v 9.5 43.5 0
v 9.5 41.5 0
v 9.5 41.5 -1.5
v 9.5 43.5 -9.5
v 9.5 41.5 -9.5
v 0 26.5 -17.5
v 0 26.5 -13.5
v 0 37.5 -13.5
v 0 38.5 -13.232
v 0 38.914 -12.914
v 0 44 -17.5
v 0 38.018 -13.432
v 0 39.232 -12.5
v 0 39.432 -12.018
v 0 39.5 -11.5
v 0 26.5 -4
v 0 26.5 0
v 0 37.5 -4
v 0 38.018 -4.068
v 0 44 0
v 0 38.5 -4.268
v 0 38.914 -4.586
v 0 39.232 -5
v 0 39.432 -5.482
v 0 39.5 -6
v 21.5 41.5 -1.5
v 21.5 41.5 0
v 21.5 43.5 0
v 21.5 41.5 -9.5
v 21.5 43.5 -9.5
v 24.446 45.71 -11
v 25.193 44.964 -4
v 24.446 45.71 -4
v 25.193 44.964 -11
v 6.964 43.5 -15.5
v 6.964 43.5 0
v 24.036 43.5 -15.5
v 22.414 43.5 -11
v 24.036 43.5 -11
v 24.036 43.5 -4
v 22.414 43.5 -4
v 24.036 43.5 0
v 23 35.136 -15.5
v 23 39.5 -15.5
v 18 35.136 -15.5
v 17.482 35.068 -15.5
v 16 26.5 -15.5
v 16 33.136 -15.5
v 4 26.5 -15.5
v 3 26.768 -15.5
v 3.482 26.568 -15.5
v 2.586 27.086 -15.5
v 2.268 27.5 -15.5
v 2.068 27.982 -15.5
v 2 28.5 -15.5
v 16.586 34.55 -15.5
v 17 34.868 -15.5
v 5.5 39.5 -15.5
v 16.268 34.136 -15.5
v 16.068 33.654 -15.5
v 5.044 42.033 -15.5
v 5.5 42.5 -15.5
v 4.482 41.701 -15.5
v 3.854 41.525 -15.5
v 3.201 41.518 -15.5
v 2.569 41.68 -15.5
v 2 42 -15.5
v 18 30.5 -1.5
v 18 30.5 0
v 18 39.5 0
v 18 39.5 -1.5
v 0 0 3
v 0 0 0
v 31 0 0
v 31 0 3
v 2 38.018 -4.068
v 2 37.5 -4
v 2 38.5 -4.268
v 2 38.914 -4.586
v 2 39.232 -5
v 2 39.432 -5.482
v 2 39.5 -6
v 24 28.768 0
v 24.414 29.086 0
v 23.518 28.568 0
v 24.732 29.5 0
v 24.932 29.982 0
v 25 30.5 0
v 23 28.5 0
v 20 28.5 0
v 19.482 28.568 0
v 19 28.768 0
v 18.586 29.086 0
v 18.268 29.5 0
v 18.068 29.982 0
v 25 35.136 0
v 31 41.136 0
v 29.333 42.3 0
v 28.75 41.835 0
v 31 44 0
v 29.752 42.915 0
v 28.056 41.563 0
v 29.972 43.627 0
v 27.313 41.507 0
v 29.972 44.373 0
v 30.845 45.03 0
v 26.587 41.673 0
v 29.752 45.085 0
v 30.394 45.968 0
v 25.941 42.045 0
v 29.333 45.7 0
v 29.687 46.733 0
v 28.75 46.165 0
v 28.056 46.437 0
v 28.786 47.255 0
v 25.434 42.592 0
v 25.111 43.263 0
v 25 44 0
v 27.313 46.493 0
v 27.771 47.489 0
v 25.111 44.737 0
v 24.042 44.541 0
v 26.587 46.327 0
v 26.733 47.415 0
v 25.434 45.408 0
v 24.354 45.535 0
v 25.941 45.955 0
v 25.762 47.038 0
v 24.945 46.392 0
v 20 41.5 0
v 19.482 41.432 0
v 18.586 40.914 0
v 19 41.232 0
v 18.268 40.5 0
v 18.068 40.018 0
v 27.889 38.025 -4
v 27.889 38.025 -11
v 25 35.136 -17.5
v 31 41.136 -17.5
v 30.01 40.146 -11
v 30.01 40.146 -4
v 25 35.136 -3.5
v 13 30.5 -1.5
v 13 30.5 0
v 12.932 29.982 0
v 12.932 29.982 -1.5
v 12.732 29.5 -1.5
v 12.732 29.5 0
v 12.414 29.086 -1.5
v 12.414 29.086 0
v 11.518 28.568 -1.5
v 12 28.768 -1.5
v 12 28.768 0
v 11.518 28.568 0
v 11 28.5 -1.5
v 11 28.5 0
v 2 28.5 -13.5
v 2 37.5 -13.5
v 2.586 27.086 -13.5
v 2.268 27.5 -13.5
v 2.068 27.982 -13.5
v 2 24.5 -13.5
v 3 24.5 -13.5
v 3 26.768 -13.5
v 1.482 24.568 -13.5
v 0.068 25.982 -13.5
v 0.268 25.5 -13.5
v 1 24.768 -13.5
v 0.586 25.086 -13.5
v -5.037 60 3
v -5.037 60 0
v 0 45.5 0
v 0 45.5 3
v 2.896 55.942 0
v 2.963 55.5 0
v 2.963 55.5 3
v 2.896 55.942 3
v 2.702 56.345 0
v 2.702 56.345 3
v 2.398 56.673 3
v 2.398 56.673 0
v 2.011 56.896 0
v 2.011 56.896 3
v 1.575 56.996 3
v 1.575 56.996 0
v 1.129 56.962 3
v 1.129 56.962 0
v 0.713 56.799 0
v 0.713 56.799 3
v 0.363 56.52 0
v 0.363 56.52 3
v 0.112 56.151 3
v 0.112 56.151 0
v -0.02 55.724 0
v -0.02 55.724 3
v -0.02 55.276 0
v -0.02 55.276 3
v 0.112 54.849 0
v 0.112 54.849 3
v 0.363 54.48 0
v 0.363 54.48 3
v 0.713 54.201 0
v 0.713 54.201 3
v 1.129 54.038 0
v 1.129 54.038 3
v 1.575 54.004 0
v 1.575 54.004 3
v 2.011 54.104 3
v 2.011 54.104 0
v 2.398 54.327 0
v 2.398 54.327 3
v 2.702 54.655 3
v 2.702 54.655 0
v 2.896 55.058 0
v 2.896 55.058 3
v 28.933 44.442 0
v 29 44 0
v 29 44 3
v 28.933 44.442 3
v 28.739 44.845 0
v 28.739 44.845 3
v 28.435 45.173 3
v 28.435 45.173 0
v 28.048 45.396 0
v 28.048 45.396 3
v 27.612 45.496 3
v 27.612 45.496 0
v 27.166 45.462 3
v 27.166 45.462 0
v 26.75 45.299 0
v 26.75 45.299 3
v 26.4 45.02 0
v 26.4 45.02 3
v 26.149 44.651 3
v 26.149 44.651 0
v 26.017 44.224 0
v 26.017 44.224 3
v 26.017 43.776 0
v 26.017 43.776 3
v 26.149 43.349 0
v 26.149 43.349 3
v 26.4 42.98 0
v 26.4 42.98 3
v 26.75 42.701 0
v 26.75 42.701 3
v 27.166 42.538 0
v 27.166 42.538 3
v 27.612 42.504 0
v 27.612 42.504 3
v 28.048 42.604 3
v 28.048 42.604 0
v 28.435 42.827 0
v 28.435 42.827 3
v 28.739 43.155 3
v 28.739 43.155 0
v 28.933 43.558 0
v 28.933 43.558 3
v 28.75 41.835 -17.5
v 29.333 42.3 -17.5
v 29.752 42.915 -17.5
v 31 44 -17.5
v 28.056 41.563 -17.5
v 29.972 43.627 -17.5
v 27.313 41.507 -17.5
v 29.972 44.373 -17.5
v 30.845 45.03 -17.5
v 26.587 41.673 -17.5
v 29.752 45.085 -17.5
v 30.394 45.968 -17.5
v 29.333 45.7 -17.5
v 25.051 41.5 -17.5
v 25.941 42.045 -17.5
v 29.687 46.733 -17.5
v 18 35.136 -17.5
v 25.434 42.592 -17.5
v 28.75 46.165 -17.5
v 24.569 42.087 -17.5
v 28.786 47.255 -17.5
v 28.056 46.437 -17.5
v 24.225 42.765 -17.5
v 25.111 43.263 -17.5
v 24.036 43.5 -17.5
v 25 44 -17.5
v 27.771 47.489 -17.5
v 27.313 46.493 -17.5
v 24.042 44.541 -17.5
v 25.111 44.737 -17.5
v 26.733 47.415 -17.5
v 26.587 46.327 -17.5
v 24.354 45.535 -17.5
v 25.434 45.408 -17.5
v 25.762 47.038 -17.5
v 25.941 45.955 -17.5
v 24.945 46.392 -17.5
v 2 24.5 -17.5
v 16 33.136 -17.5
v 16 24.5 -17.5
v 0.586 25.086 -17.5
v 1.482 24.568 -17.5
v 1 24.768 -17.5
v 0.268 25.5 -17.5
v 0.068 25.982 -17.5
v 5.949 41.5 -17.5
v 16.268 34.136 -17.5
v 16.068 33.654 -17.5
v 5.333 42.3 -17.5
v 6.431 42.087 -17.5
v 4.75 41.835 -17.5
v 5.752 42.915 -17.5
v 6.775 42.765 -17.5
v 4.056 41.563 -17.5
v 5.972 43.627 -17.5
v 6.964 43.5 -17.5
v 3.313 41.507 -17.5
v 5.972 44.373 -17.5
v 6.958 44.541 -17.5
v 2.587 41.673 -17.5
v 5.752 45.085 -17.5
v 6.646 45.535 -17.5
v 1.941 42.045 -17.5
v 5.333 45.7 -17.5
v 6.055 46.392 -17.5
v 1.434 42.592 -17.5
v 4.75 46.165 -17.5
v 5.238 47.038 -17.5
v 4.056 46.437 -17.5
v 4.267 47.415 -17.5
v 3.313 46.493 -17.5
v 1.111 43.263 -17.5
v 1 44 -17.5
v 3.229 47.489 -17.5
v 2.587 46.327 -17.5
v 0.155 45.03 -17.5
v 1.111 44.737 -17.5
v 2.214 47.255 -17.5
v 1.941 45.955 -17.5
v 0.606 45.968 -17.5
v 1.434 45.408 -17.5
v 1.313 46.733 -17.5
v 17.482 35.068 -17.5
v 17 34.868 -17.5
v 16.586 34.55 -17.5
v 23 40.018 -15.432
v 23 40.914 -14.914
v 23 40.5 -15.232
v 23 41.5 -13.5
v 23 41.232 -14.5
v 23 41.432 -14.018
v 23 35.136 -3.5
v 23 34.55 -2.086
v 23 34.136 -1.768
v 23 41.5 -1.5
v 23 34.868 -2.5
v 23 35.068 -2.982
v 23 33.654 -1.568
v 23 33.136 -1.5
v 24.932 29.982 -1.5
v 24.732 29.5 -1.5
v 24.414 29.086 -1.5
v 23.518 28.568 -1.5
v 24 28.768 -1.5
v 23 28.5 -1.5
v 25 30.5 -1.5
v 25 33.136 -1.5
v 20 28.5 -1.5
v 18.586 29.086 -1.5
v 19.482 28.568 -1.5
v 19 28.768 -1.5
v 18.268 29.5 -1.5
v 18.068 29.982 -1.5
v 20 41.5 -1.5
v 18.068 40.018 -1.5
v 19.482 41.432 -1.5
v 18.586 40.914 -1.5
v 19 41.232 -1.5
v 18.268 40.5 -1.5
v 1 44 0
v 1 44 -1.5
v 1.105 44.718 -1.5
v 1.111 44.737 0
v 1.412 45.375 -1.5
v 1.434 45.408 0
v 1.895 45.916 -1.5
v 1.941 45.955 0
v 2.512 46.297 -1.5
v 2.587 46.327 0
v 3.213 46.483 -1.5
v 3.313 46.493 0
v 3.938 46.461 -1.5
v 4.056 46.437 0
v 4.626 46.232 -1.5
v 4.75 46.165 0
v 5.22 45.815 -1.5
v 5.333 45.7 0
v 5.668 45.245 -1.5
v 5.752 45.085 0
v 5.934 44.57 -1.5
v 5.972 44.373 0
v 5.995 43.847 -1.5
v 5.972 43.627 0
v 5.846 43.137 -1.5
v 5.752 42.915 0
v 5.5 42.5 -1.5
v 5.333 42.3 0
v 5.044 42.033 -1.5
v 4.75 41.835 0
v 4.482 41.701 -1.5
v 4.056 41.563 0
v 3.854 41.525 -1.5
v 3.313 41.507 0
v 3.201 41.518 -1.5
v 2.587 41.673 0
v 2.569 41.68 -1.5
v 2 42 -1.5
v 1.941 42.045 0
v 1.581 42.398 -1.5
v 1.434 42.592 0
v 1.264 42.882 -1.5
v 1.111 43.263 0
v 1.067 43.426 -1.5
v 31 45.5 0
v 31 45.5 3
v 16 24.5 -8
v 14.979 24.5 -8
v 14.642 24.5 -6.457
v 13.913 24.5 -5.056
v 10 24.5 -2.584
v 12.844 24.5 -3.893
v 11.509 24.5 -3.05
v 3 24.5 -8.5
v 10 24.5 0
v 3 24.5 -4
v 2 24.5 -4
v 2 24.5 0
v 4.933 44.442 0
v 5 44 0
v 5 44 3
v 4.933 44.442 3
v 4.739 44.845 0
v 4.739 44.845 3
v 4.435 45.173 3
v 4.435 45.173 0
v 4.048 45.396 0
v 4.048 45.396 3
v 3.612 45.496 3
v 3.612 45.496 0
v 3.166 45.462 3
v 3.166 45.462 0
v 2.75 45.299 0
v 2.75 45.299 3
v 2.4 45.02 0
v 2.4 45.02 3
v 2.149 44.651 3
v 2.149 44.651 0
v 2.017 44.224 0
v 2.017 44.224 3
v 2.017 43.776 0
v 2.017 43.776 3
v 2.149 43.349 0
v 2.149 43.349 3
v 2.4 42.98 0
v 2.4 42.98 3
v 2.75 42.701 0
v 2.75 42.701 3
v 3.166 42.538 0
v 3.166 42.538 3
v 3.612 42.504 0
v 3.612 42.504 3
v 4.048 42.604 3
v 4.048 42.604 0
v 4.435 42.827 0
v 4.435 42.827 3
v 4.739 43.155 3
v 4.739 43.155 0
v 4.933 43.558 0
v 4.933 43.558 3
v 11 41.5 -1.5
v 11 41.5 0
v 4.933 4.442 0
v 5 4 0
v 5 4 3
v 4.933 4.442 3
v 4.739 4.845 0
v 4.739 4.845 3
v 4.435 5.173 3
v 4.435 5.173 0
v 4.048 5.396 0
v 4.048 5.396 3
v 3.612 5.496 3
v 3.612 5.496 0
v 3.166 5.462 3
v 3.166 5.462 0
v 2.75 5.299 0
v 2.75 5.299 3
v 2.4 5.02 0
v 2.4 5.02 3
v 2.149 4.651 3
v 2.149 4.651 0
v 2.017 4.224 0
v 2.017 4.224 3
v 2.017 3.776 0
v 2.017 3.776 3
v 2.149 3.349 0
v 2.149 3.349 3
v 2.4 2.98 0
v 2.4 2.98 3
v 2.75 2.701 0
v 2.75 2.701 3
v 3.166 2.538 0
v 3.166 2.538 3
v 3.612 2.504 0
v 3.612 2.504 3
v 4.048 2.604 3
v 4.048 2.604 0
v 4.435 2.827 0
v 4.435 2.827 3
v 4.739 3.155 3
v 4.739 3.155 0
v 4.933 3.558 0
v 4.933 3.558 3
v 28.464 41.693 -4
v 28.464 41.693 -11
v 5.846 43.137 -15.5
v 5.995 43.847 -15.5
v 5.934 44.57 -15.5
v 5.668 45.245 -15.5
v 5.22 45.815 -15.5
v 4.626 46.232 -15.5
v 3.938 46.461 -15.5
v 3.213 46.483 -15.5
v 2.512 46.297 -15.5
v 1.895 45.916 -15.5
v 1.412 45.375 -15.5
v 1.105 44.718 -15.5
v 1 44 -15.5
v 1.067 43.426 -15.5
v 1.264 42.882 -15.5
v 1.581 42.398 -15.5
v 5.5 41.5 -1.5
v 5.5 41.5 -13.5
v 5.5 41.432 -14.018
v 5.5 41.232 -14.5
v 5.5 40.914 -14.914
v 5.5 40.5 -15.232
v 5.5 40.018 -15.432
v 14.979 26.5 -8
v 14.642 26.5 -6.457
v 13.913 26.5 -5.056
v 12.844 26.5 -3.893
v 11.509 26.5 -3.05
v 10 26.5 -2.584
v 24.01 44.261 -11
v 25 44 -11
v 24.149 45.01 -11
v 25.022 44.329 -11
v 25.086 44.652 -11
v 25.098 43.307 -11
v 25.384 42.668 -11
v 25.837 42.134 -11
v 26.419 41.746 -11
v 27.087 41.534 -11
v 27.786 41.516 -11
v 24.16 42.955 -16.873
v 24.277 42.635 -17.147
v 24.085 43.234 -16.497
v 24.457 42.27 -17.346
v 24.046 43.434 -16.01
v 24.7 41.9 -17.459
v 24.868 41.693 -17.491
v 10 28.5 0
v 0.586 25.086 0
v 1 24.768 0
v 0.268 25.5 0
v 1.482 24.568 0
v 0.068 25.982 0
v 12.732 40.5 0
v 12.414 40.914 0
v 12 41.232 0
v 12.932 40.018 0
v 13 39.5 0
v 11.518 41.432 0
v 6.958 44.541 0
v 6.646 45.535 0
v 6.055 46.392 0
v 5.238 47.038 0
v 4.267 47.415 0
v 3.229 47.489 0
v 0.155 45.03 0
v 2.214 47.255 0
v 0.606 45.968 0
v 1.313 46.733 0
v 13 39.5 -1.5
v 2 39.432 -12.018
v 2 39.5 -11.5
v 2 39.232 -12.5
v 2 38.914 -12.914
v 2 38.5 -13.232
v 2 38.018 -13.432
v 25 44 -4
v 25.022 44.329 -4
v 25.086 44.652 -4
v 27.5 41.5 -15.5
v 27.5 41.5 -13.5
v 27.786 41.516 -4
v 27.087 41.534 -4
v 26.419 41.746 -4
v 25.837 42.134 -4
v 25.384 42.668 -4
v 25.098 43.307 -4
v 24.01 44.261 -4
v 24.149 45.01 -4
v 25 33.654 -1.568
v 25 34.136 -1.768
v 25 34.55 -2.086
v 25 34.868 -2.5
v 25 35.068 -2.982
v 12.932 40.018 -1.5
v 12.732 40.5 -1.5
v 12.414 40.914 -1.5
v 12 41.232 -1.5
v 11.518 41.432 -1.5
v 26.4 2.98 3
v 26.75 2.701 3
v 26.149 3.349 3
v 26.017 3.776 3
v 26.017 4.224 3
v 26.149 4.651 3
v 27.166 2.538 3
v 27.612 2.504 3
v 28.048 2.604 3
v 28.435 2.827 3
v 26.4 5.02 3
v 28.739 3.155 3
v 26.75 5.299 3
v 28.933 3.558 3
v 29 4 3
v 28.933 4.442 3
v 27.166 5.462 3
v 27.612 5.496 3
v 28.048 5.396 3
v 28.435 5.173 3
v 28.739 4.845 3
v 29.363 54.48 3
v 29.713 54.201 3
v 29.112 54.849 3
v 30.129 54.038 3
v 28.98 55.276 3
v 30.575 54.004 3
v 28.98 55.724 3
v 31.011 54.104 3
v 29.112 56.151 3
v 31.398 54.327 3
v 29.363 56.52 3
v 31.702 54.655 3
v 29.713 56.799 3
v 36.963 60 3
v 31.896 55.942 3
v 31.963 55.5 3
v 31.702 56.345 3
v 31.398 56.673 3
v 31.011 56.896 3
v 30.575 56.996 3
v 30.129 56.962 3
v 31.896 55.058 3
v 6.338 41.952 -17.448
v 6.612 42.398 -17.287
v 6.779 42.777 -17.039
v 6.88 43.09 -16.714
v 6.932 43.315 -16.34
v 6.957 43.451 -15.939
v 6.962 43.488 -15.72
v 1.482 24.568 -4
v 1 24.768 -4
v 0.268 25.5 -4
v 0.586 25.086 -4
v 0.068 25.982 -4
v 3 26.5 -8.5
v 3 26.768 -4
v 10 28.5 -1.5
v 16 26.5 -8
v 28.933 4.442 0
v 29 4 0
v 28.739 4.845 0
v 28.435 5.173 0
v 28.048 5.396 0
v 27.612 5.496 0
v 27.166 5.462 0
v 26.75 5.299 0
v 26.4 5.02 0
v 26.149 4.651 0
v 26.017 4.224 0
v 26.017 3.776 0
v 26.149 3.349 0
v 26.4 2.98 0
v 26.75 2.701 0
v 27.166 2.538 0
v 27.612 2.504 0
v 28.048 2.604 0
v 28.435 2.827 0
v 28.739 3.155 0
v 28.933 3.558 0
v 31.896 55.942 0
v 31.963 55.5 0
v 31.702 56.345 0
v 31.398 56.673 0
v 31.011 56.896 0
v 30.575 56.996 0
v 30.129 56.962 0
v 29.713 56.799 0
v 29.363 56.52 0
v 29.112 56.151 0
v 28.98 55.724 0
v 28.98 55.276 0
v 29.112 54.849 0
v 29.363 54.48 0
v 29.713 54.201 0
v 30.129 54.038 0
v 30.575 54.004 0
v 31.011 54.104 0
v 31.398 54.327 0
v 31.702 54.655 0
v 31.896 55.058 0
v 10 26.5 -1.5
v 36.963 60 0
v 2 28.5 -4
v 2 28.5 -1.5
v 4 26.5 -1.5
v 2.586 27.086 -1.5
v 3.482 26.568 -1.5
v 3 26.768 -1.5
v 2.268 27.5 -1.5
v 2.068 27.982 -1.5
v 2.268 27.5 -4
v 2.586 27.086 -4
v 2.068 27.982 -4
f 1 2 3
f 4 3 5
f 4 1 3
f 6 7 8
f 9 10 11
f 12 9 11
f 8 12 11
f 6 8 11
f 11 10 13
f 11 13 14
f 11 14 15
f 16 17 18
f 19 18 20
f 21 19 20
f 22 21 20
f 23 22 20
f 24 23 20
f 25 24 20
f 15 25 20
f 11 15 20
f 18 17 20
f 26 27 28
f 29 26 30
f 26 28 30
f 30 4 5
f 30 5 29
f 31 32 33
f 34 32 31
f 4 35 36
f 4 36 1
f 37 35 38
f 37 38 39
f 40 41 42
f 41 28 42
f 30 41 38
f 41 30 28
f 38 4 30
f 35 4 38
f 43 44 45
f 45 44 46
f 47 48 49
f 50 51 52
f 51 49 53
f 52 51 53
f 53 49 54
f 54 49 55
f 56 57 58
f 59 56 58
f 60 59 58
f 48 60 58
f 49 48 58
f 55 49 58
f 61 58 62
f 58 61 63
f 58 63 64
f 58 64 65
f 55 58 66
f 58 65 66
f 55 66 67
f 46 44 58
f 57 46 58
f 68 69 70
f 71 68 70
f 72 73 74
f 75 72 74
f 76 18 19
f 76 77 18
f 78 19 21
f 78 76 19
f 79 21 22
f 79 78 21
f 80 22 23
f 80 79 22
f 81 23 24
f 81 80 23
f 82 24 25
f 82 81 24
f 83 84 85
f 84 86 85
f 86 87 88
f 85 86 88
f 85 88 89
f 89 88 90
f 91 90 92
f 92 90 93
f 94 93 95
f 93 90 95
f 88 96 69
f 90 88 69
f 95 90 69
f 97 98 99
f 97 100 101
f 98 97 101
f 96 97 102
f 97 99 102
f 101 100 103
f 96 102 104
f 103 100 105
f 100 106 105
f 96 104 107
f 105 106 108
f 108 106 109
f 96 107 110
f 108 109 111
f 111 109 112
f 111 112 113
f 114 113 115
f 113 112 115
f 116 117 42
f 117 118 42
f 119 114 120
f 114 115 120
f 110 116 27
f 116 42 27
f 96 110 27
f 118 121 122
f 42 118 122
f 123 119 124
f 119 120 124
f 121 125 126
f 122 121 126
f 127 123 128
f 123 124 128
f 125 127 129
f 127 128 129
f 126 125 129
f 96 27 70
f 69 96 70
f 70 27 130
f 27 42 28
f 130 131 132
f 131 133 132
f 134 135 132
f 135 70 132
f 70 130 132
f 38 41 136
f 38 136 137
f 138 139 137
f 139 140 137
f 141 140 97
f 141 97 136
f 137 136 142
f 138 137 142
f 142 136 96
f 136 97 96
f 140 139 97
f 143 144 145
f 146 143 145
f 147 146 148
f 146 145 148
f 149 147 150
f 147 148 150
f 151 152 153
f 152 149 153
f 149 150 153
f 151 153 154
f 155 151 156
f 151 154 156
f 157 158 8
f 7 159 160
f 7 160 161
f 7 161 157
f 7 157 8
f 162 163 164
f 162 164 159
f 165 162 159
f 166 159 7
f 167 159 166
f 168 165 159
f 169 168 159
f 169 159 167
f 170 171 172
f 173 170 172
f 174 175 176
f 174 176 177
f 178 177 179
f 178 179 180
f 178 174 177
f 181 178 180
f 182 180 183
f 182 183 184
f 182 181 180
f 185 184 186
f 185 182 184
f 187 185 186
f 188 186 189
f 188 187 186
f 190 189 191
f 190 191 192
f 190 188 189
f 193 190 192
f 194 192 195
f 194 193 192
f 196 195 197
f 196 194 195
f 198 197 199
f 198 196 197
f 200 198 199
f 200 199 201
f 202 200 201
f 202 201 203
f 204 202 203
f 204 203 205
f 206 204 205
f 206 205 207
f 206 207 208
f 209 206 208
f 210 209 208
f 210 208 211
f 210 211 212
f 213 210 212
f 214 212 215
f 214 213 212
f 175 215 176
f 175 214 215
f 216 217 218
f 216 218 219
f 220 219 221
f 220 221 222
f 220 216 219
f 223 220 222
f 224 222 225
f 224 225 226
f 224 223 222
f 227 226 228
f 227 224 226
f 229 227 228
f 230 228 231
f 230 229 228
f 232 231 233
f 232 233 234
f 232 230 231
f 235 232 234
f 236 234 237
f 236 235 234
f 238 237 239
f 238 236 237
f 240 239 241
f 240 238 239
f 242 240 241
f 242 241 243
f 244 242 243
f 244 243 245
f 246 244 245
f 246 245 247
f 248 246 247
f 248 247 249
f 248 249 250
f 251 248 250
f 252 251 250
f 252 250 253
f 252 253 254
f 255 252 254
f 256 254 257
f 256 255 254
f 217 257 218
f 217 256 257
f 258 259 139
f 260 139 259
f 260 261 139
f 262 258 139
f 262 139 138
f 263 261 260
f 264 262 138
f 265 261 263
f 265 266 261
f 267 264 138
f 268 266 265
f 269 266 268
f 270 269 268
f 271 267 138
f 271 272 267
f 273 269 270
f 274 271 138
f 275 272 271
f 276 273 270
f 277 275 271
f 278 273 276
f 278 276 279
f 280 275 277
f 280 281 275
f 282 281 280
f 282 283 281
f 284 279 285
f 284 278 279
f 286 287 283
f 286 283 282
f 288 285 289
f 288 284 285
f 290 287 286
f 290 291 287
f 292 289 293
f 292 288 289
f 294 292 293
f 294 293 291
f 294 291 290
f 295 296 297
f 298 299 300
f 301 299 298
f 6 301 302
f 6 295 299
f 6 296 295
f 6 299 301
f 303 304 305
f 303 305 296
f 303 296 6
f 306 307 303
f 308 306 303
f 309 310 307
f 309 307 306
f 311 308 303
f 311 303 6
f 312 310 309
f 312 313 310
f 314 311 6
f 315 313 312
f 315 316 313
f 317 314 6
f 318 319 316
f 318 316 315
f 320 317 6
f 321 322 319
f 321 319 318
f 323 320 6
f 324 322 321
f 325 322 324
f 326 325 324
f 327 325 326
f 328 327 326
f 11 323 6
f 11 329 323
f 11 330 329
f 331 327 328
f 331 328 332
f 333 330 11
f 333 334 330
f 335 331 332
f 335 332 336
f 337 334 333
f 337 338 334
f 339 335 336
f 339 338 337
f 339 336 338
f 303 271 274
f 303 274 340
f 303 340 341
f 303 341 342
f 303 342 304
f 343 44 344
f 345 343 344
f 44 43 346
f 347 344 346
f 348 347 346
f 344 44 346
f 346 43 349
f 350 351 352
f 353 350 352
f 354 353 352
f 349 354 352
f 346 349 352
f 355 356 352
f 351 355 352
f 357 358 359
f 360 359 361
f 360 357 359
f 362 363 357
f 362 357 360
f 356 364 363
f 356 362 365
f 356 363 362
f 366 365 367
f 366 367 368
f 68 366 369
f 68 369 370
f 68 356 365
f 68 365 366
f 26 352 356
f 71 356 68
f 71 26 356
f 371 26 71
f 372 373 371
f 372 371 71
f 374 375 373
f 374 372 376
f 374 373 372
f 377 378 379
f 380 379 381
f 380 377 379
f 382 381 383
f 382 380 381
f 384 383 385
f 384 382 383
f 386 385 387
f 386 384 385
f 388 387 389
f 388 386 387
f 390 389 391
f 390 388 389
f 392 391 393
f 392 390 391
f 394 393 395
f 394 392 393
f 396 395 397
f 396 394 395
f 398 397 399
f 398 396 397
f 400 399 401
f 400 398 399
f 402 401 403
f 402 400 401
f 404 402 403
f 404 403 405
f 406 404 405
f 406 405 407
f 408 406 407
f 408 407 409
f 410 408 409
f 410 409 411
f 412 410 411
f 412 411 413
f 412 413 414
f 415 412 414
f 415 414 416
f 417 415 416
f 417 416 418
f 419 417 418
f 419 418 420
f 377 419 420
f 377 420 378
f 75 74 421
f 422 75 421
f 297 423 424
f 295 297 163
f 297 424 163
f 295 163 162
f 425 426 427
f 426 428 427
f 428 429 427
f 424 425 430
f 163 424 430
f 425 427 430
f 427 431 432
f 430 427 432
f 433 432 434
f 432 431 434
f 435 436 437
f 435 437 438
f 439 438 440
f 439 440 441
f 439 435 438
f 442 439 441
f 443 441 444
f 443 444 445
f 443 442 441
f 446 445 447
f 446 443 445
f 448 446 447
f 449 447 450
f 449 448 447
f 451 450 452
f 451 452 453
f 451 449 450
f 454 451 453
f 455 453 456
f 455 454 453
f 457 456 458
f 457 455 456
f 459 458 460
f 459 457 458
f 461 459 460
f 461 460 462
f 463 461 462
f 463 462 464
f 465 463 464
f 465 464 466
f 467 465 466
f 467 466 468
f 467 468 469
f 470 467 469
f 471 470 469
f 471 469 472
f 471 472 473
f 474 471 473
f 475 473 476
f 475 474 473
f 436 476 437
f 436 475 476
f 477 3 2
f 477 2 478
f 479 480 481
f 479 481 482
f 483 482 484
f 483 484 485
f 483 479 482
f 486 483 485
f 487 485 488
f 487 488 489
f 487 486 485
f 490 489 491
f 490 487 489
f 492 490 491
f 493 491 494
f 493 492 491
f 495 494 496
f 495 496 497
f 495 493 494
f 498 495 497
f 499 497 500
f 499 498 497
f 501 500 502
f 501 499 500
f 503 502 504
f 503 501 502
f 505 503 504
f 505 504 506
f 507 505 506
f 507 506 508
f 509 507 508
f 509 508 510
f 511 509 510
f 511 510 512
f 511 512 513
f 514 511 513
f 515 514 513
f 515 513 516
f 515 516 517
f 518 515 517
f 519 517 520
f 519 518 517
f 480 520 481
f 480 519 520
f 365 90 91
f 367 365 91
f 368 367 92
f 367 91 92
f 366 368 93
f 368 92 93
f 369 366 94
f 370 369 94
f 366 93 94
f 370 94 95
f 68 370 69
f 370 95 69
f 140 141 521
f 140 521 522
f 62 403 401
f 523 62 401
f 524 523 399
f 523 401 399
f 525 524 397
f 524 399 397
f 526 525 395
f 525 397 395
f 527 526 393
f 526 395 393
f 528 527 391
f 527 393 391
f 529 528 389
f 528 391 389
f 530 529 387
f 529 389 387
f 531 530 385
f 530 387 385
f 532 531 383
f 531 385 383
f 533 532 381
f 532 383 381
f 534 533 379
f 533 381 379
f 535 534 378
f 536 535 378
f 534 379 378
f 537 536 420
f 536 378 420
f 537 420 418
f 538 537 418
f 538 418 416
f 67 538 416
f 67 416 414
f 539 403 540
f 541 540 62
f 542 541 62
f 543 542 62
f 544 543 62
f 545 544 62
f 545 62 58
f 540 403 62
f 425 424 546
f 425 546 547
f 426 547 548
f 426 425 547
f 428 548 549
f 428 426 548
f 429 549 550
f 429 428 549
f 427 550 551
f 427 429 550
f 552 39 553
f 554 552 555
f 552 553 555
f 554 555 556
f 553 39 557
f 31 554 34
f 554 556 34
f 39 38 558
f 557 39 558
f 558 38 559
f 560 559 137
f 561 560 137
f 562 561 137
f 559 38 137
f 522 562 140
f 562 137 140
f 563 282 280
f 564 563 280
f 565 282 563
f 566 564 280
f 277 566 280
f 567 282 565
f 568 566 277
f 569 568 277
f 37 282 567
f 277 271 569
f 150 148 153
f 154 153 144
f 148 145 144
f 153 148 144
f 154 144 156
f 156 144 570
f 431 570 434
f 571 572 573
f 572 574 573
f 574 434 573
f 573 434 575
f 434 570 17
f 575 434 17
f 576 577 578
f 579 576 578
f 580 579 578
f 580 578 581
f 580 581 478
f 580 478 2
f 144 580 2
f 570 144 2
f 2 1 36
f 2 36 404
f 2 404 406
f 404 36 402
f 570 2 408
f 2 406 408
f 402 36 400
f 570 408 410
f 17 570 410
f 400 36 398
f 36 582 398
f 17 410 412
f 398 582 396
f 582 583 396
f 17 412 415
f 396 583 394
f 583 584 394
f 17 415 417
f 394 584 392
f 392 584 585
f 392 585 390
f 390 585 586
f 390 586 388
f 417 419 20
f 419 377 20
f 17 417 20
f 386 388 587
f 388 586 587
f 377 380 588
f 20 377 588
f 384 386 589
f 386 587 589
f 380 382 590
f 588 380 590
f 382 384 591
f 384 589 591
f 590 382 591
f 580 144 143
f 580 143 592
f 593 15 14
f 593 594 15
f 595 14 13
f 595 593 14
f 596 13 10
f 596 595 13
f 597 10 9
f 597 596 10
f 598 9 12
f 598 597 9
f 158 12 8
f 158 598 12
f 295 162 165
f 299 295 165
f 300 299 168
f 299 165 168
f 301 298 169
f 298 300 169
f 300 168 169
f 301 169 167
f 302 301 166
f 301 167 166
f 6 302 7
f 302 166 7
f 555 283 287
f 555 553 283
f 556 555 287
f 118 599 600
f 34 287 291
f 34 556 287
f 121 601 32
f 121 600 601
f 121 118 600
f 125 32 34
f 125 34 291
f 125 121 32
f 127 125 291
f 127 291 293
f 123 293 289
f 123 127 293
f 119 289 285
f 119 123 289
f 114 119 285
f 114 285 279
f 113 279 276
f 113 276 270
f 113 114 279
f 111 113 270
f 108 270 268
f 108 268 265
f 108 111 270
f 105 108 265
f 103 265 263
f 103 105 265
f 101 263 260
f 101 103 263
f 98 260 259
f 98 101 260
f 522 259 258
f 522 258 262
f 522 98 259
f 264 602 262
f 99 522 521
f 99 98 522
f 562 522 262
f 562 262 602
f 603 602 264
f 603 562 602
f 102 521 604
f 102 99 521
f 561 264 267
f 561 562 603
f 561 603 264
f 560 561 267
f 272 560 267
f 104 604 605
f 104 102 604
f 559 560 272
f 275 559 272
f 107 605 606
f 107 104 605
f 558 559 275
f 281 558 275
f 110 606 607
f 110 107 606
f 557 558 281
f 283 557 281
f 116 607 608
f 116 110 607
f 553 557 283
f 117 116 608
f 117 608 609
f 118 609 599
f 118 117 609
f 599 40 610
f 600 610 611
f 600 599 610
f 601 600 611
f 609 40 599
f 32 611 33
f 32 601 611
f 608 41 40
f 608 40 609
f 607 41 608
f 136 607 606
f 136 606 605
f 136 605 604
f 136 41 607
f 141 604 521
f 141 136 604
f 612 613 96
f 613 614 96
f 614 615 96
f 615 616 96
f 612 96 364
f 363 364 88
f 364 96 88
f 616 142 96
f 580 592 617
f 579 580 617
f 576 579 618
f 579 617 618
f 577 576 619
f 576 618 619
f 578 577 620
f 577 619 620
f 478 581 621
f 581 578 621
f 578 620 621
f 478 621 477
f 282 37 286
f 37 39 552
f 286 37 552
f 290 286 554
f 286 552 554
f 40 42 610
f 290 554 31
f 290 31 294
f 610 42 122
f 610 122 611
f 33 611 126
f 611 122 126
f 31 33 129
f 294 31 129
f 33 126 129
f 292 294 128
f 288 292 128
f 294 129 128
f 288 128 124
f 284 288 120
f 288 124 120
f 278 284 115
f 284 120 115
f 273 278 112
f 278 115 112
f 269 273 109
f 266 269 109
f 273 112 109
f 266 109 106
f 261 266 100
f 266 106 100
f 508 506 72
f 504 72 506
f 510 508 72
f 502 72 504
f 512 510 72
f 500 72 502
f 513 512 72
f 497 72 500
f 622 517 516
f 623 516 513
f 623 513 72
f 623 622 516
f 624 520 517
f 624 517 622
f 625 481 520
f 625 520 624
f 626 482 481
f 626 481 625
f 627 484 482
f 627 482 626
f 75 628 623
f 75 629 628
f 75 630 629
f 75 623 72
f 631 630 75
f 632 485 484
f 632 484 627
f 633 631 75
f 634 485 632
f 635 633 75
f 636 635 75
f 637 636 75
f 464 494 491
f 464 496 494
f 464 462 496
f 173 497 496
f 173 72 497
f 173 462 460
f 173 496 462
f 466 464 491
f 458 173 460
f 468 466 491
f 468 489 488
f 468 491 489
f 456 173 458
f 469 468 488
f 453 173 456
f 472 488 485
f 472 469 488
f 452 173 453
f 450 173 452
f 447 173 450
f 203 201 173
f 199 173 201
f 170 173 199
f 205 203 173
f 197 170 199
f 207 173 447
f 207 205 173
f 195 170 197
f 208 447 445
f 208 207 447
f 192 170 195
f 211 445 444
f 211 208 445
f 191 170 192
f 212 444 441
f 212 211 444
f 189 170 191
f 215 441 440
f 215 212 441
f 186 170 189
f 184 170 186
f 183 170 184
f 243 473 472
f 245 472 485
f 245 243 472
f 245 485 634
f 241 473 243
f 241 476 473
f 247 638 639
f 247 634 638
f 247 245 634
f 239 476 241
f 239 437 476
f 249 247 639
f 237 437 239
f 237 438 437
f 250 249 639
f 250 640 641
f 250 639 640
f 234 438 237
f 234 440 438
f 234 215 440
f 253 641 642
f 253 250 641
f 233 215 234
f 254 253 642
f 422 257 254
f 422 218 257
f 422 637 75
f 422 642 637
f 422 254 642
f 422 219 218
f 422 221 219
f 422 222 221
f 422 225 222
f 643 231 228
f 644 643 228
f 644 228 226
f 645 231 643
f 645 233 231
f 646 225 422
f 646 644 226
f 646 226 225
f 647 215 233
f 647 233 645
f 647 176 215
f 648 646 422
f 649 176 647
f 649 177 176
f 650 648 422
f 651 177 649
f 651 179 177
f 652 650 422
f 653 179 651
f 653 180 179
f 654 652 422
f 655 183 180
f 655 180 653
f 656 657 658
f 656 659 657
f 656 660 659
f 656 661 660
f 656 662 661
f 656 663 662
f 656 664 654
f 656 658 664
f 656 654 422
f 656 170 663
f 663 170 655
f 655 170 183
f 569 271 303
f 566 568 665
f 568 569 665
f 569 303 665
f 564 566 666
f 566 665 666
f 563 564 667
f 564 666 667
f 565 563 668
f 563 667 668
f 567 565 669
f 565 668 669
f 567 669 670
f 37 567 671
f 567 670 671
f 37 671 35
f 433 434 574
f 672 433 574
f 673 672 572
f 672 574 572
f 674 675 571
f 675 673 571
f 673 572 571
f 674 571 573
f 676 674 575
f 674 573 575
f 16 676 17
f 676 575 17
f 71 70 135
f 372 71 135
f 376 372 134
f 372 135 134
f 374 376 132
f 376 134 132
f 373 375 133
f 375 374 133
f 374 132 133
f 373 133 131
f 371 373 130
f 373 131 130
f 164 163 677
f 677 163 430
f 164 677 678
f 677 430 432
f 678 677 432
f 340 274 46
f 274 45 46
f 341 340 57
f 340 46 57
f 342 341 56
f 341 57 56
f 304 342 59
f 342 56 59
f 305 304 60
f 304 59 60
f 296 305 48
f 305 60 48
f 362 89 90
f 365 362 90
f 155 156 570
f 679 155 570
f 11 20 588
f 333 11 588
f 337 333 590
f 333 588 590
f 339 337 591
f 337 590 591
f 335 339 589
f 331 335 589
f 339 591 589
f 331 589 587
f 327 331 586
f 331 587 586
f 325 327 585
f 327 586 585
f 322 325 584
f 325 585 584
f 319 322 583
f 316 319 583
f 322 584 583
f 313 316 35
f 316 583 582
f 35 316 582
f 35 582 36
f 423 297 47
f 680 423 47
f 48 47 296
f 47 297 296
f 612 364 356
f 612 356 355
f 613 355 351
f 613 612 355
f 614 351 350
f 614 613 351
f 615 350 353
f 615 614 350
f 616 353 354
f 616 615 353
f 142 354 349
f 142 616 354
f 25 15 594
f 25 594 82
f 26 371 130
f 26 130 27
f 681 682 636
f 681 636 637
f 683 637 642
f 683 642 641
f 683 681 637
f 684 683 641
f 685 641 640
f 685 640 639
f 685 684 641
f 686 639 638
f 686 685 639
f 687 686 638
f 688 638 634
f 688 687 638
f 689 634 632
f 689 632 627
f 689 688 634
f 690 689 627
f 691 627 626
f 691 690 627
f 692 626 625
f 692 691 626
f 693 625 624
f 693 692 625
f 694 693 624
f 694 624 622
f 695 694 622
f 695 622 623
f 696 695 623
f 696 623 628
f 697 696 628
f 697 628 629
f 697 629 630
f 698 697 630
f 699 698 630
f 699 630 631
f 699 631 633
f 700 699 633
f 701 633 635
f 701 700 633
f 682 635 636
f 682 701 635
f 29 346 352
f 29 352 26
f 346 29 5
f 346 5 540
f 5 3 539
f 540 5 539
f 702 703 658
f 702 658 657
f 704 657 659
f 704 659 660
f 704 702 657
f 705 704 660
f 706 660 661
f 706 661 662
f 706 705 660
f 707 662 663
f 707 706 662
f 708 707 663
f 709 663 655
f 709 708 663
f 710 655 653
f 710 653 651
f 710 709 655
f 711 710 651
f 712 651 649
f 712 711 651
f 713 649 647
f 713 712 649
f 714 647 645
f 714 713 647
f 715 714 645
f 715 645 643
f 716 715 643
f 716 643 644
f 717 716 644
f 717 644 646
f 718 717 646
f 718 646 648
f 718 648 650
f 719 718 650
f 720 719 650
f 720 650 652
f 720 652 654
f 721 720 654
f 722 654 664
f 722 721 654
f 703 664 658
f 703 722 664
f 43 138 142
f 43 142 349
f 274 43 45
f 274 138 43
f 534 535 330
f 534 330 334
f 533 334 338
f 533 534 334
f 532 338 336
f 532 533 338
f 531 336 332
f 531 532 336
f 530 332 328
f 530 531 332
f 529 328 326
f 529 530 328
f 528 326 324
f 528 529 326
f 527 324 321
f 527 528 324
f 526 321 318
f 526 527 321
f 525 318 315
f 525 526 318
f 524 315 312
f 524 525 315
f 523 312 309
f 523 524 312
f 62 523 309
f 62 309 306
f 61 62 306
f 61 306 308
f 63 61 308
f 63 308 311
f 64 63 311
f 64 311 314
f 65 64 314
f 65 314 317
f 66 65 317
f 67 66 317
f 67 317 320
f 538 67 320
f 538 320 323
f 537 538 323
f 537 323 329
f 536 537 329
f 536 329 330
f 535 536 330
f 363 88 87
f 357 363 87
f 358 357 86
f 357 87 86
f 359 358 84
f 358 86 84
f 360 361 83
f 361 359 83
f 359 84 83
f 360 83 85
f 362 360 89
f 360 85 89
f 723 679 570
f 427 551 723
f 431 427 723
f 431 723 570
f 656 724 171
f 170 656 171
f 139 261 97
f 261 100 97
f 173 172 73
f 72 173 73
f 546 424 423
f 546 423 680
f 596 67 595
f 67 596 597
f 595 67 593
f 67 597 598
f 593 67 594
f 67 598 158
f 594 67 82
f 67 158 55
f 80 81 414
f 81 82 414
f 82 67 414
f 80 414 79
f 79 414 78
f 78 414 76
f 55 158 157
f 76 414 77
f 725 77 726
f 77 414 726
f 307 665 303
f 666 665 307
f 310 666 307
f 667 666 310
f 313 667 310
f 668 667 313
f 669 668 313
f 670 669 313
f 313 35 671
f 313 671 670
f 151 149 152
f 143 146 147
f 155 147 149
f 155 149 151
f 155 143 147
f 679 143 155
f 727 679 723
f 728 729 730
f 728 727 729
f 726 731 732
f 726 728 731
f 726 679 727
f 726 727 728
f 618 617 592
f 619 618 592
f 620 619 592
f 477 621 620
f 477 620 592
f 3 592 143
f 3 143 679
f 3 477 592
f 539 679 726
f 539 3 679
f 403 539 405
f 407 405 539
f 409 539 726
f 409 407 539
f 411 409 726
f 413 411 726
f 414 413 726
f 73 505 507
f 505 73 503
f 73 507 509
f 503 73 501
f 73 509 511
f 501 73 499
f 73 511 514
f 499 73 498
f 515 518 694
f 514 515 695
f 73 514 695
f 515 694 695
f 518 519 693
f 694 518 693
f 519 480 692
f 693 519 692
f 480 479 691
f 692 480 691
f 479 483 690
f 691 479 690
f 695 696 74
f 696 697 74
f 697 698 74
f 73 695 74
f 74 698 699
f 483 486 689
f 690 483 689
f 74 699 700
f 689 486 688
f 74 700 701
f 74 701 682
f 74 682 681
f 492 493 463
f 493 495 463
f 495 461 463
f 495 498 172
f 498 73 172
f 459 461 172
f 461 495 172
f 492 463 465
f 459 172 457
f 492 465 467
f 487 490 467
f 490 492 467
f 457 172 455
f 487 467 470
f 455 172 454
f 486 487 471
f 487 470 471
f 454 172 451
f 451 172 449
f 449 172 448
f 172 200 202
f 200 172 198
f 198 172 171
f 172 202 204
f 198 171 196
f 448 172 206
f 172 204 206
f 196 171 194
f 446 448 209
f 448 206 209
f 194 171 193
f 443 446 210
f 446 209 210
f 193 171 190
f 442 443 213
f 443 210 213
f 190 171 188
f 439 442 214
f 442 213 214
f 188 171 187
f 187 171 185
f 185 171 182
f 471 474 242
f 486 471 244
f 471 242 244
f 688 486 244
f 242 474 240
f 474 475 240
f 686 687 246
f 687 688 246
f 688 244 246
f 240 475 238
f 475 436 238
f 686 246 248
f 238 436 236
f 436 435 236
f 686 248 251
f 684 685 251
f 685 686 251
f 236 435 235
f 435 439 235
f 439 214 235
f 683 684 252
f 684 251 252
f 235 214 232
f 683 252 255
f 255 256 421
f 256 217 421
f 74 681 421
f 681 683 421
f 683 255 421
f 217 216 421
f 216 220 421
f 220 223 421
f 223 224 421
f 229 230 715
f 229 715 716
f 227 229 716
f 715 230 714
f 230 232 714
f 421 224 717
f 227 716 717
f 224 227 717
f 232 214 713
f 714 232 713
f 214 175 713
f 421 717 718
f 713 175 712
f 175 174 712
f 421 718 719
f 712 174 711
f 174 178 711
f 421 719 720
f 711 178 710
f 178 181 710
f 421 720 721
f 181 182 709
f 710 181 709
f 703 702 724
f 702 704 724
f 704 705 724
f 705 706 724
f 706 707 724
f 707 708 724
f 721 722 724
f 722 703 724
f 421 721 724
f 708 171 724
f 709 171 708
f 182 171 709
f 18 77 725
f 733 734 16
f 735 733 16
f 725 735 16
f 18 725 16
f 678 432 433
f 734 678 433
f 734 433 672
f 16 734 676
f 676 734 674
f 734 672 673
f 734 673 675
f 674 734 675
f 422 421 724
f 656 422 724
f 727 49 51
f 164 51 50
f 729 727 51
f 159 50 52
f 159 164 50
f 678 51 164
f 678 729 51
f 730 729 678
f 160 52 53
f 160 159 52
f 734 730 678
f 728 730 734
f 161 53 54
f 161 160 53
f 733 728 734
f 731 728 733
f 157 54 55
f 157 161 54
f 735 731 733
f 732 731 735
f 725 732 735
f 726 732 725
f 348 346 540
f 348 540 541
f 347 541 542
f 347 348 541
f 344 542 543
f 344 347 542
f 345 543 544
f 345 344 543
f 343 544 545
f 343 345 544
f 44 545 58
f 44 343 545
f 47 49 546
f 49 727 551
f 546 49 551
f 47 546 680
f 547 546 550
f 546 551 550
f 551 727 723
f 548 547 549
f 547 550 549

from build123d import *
from build123d.topology import SkipClean

# Parameters (mm, degrees)
SKETCH1_R           = 1.5
BOSS_EXTRUDE1_DEPTH = 3
SKETCH2_R           = 2.5
BOSS_EXTRUDE2_DEPTH = 1.5
SKETCH5_R           = 2.5
BOSS_EXTRUDE5_DEPTH = 14
SKETCH6_R           = 2.5
BOSS_EXTRUDE6_DEPTH = 2
SKETCH8_W           = 9.5
SKETCH8_H           = 15
CUT_EXTRUDE1_DEPTH  = 3
CUT_EXTRUDE2_REACH  = 56.155
SKETCH9_W           = 12
SKETCH9_H           = 8
SKETCH11_W          = 8
SKETCH11_H          = 4
CUT_EXTRUDE4_DEPTH  = 2
SKETCH13_W          = 5
SKETCH13_H          = 15
CUT_EXTRUDE7_DEPTH  = 1.5
SKETCH15_W          = 12
SKETCH15_H          = 9.5
CUT_EXTRUDE8_DEPTH  = 2
SKETCH16_W          = 7
SKETCH16_H          = 3
CUT_EXTRUDE9_DEPTH  = 72.346897019
FILLET1_R           = 2
CUT_EXTRUDE11_REACH = 75.393
SKETCH21_W          = 9
SKETCH21_H          = 10.636038969
SKETCH23_R          = 6
BOSS_EXTRUDE7_DEPTH = 2
FILLET2_R           = 2


with BuildPart() as part:
    # Sketch1 → Boss-Extrude1 (new body)
    with BuildSketch(Plane.XY):
        Polygon((0, 0), (31, 0), (31, 45.5), (36.963007518, 60), (-5.036992482, 60), (0, 45.5), align=None)
        with Locations((30.463007518, 55.5)):
            Circle(SKETCH1_R, mode=Mode.SUBTRACT)
        with Locations((27.5, 44)):
            Circle(SKETCH1_R, mode=Mode.SUBTRACT)
        with Locations((27.5, 4)):
            Circle(SKETCH1_R, mode=Mode.SUBTRACT)
        with Locations((3.5, 4)):
            Circle(SKETCH1_R, mode=Mode.SUBTRACT)
        with Locations((3.5, 44)):
            Circle(SKETCH1_R, mode=Mode.SUBTRACT)
        with Locations((1.463007518, 55.5)):
            Circle(SKETCH1_R, mode=Mode.SUBTRACT)
    extrude(amount=BOSS_EXTRUDE1_DEPTH)


with BuildPart() as body_2:
    # Sketch2 → Boss-Extrude2 (new body)
    with BuildSketch(Plane(origin=(0, 0, 0), x_dir=(-1, 0, 0), z_dir=(0, 0, -1))):
        with BuildLine():
            Line((0, 24.5), (0, 44))
            ThreePointArc((0, 44), (-3.750643519, 47.491013868), (-6.964101615, 43.5))
            Line((-6.964101615, 43.5), (-24.035898385, 43.5))
            ThreePointArc((-24.035898385, 43.5), (-27.249356481, 47.491013868), (-31, 44))
            Line((-31, 44), (-31, 41.136038969))
            Line((-31, 41.136038969), (-25, 35.136038969))
            Line((-25, 35.136038969), (-25, 28.5))
            Line((-25, 28.5), (-18, 28.5))
            Line((-18, 28.5), (-18, 24.5))
            Line((-18, 24.5), (0, 24.5))
        make_face()
        with Locations((-27.5, 44)):
            Circle(SKETCH2_R, mode=Mode.SUBTRACT)
        with Locations((-3.5, 44)):
            Circle(SKETCH2_R, mode=Mode.SUBTRACT)
    extrude(amount=BOSS_EXTRUDE2_DEPTH)

    # Sketch5 → Boss-Extrude5 (add)
    with SkipClean():  # the faces are left unmerged after this step: merging them gives an invalid solid
        with BuildSketch(Plane(origin=(0, 0, -1.5), x_dir=(-1, 0, 0), z_dir=(0, 0, -1))):
            with BuildLine():
                Line((-6.964101615, 43.5), (-24.035898385, 43.5))
                ThreePointArc((-24.035898385, 43.5), (-27.249356481, 47.491013868), (-31, 44))
                Line((-31, 44), (-31, 41.136038969))
                Line((-31, 41.136038969), (-25, 35.136038969))
                Line((-25, 35.136038969), (-25, 28.5))
                Line((-25, 28.5), (-18, 28.5))
                Line((-18, 28.5), (-18, 24.5))
                Line((-18, 24.5), (0, 24.5))
                Line((0, 24.5), (0, 44))
                ThreePointArc((0, 44), (-3.750643519, 47.491013868), (-6.964101615, 43.5))
            make_face()
            with Locations((-27.5, 44)):
                Circle(SKETCH5_R, mode=Mode.SUBTRACT)
            with BuildLine():
                Line((-23, 41.5), (-5.5, 41.5))
                Line((-5.5, 41.5), (-5.5, 42.5))
                ThreePointArc((-5.5, 42.5), (-3.146446609, 46.474873734), (-2, 42))
                Line((-2, 42), (-2, 26.5))
                Line((-2, 26.5), (-16, 26.5))
                Line((-16, 26.5), (-16, 30.5))
                Line((-16, 30.5), (-23, 30.5))
                Line((-23, 30.5), (-23, 41.5))
            make_face(mode=Mode.SUBTRACT)
        extrude(amount=BOSS_EXTRUDE5_DEPTH)

    # Sketch6 → Boss-Extrude6 (add)
    with SkipClean():  # the faces are left unmerged after this step: merging them gives an invalid solid
        with BuildSketch(Plane(origin=(0, 0, -15.5), x_dir=(-1, 0, 0), z_dir=(0, 0, -1))):
            with BuildLine():
                Line((-6.964101615, 43.5), (-24.035898385, 43.5))
                ThreePointArc((-24.035898385, 43.5), (-27.249356481, 47.491013868), (-31, 44))
                Line((-31, 44), (-31, 41.136038969))
                Line((-31, 41.136038969), (-25, 35.136038969))
                Line((-25, 35.136038969), (-25, 28.5))
                Line((-25, 28.5), (-18, 28.5))
                Line((-18, 28.5), (-18, 24.5))
                Line((-18, 24.5), (0, 24.5))
                Line((0, 24.5), (0, 44))
                ThreePointArc((0, 44), (-3.750643519, 47.491013868), (-6.964101615, 43.5))
            make_face()
            with Locations((-3.5, 44)):
                Circle(SKETCH6_R, mode=Mode.SUBTRACT)
            with Locations((-27.5, 44)):
                Circle(SKETCH6_R, mode=Mode.SUBTRACT)
        extrude(amount=BOSS_EXTRUDE6_DEPTH)

    # Sketch8 → Cut-Extrude1 (cut)
    with SkipClean():  # the faces are left unmerged after this step: merging them gives an invalid solid
        with BuildSketch(Plane.ZY):
            with Locations((-8.75, 32)):
                Rectangle(SKETCH8_W, SKETCH8_H)
        extrude(amount=-CUT_EXTRUDE1_DEPTH, mode=Mode.SUBTRACT)

    # Cut-Extrude2: up to this face of the body (flat: up to its plane)
    cut_extrude2_end = Plane(body_2.part.faces().sort_by_distance((21.5, 28.5, -8.5))[0])
    # Sketch9 → Cut-Extrude2 (cut, up to the picked face)
    with BuildSketch(Plane.XZ.offset(-24.5), mode=Mode.PRIVATE) as cut_extrude2_sk1:
        with Locations((16, -4)):
            Rectangle(SKETCH9_W, SKETCH9_H)
    cut_extrude2_tool1 = split(extrude(cut_extrude2_sk1.sketch, amount=-CUT_EXTRUDE2_REACH, mode=Mode.PRIVATE), bisect_by=cut_extrude2_end, keep=Keep.BOTH, mode=Mode.PRIVATE)
    add(cut_extrude2_tool1.solids().sort_by(Axis((16, 24.5, -4), (0, 1, 0)))[0], mode=Mode.SUBTRACT)

    # Sketch11 → Cut-Extrude4 (cut)
    with SkipClean():  # the faces are left unmerged after this step: merging them gives an invalid solid
        with BuildSketch(Plane(origin=(25, 0, 0), x_dir=(0, 0, -1), z_dir=(1, 0, 0))):
            with Locations((8, 32.5)):
                Rectangle(SKETCH11_W, SKETCH11_H)
        extrude(amount=-CUT_EXTRUDE4_DEPTH, mode=Mode.SUBTRACT)

    # Sketch13 → Cut-Extrude7 (cut)
    with SkipClean():  # the faces are left unmerged after this step: merging them gives an invalid solid
        with BuildSketch(Plane.XY):
            with Locations((15.5, 36)):
                Rectangle(SKETCH13_W, SKETCH13_H)
        extrude(amount=-CUT_EXTRUDE7_DEPTH, mode=Mode.SUBTRACT)

    # Sketch15 → Cut-Extrude8 (cut)
    with SkipClean():  # the faces are left unmerged after this step: merging them gives an invalid solid
        with BuildSketch(Plane(origin=(0, 43.5, 0), x_dir=(1, 0, 0), z_dir=(0, 1, 0))):
            with Locations((15.5, 4.75)):
                Rectangle(SKETCH15_W, SKETCH15_H)
        extrude(amount=-CUT_EXTRUDE8_DEPTH, mode=Mode.SUBTRACT)

    # Sketch16 → Cut-Extrude9 (cut, through all)
    with SkipClean():  # the faces are left unmerged after this step: merging them gives an invalid solid
        with BuildSketch(Plane(origin=(-5.068019485, 5.068019485, 0), x_dir=(0, 0, -1), z_dir=(0.7071067811865467, -0.7071067811865485, 0))):
            with Locations((7.5, 48.108387387)):
                Rectangle(SKETCH16_W, SKETCH16_H)
        extrude(amount=-CUT_EXTRUDE9_DEPTH, mode=Mode.SUBTRACT)

    # Fillet1
    # the kernel refuses this fillet: 2 mm, written as the material it adds along each edge
    with BuildSketch(Plane(origin=(2, 26.5, -1.5), x_dir=(1, 0, 0), z_dir=(0, 0, -1))) as fillet1_piece_1_section:
        with BuildLine():
            CenterArc((FILLET1_R, -FILLET1_R), FILLET1_R, 90, 90)
            Line((0, -FILLET1_R), (0, 0))
            Line((0, 0), (FILLET1_R, 0))
        make_face()
    fillet1_piece_1 = extrude(amount=7.5, mode=Mode.PRIVATE)
    fillet1_piece_1 = split(fillet1_piece_1, bisect_by=Plane(origin=(3, 26.579369185, -2.75), z_dir=(1, 0, 0)), keep=Keep.TOP, mode=Mode.PRIVATE)
    add(fillet1_piece_1)
    with BuildSketch(Plane(origin=(2, 26.5, -1.5), x_dir=(1, 0, 0), z_dir=(0, 0, -1))) as fillet1_piece_2:
        with BuildLine():
            CenterArc((FILLET1_R, -FILLET1_R), FILLET1_R, 90, 90)
            Line((0, -FILLET1_R), (0, 0))
            Line((0, 0), (FILLET1_R, 0))
        make_face()
    extrude(amount=2.5)
    with BuildSketch(Plane(origin=(18, 28.5, -8), x_dir=(0, -1, 0), z_dir=(0, 0, -1))) as fillet1_piece_3:
        with BuildLine():
            CenterArc((FILLET1_R, -FILLET1_R), FILLET1_R, 90, 90)
            Line((0, -FILLET1_R), (0, 0))
            Line((0, 0), (FILLET1_R, 0))
        make_face()
    extrude(amount=7.5)
    with BuildSketch(Plane(origin=(28, 41.5, -15.5), x_dir=(0, 0, 1), z_dir=(-1, 0, 0))) as fillet1_piece_4:
        with BuildLine():
            CenterArc((FILLET1_R, -FILLET1_R), FILLET1_R, 90, 90)
            Line((0, -FILLET1_R), (0, 0))
            Line((0, 0), (FILLET1_R, 0))
        make_face()
    extrude(amount=22.5)
    with BuildSketch(Plane(origin=(2, 26.5, -8.5), x_dir=(1, 0, 0), z_dir=(0, 0, -1))) as fillet1_piece_5_section:
        with BuildLine():
            CenterArc((FILLET1_R, -FILLET1_R), FILLET1_R, 90, 90)
            Line((0, -FILLET1_R), (0, 0))
            Line((0, 0), (FILLET1_R, 0))
        make_face()
    fillet1_piece_5 = extrude(amount=7, mode=Mode.PRIVATE)
    fillet1_piece_5 = split(fillet1_piece_5, bisect_by=Plane(origin=(3, 26.579369185, -11), z_dir=(1, 0, 0)), keep=Keep.TOP, mode=Mode.PRIVATE)
    add(fillet1_piece_5)
    with BuildSketch(Plane(origin=(2, 26.5, -13.5), x_dir=(1, 0, 0), z_dir=(0, 0, -1)), Plane(origin=(18, 28.5, -15.5), x_dir=(0, -1, 0), z_dir=(0, 0, -1))) as fillet1_piece_6:
        with BuildLine():
            CenterArc((FILLET1_R, -FILLET1_R), FILLET1_R, 90, 90)
            Line((0, -FILLET1_R), (0, 0))
            Line((0, 0), (FILLET1_R, 0))
        make_face()
    extrude(amount=2)
    # the kernel refuses this fillet: 2 mm, written as the material it takes off along each edge
    with BuildSketch(Plane(origin=(0, 24.5, -1.5), x_dir=(0, 1, 0), z_dir=(0, 0, -1))) as fillet1_2_piece_1:
        with BuildLine():
            CenterArc((FILLET1_R, FILLET1_R), FILLET1_R, 180, 90)
            Line((0, FILLET1_R), (0, 0))
            Line((0, 0), (FILLET1_R, 0))
        make_face()
    extrude(amount=7.5, mode=Mode.SUBTRACT)
    with BuildSketch(Plane(origin=(0, 24.5, -15.5), x_dir=(0, 1, 0), z_dir=(0, 0, -1)), Plane(origin=(18, 24.5, -15.5), x_dir=(-1, 0, 0), z_dir=(0, 0, -1)), Plane(origin=(0, 24.5, -8.5), x_dir=(0, 1, 0), z_dir=(0, 0, -1))) as fillet1_2_piece_2:
        with BuildLine():
            CenterArc((FILLET1_R, FILLET1_R), FILLET1_R, 180, 90)
            Line((0, FILLET1_R), (0, 0))
            Line((0, 0), (FILLET1_R, 0))
        make_face()
    extrude(amount=7, mode=Mode.SUBTRACT)
    with BuildSketch(Plane(origin=(18, 24.5, -3), x_dir=(-1, 0, 0), z_dir=(0, 0, -1))) as fillet1_2_piece_3:
        with BuildLine():
            CenterArc((FILLET1_R, FILLET1_R), FILLET1_R, 180, 90)
            Line((0, FILLET1_R), (0, 0))
            Line((0, 0), (FILLET1_R, 0))
        make_face()
    extrude(amount=12.5, mode=Mode.SUBTRACT)
    with BuildSketch(Plane(origin=(25, 28.5, -1.5), x_dir=(-1, 0, 0), z_dir=(0, 0, -1))) as fillet1_2_piece_4:
        with BuildLine():
            CenterArc((FILLET1_R, FILLET1_R), FILLET1_R, 180, 90)
            Line((0, FILLET1_R), (0, 0))
            Line((0, 0), (FILLET1_R, 0))
        make_face()
    extrude(amount=14, mode=Mode.SUBTRACT)
    with BuildSketch(Plane(origin=(13, 28.5, 5), x_dir=(-1, 0, 0), z_dir=(0, 0, -1)), Plane(origin=(18, 41.5, 5), x_dir=(1, 0, 0), z_dir=(0, 0, -1))) as fillet1_2_piece_5:
        with BuildLine():
            CenterArc((FILLET1_R, FILLET1_R), FILLET1_R, 180, 90)
            Line((0, FILLET1_R), (0, 0))
            Line((0, 0), (FILLET1_R, 0))
        make_face()
    extrude(amount=11.5, mode=Mode.SUBTRACT)
    with BuildSketch(Plane(origin=(18, 28.5, 5), x_dir=(0, 1, 0), z_dir=(0, 0, -1)), Plane(origin=(25, 28.5, 5), x_dir=(-1, 0, 0), z_dir=(0, 0, -1)), Plane(origin=(0, 24.5, 5), x_dir=(0, 1, 0), z_dir=(0, 0, -1))) as fillet1_2_piece_6:
        with BuildLine():
            CenterArc((FILLET1_R, FILLET1_R), FILLET1_R, 180, 90)
            Line((0, FILLET1_R), (0, 0))
            Line((0, 0), (FILLET1_R, 0))
        make_face()
    extrude(amount=6.5, mode=Mode.SUBTRACT)
    with BuildSketch(Plane(origin=(13, 41.5, -6.5), x_dir=(0, -1, 0), z_dir=(0, 0, 1))) as fillet1_2_piece_7:
        with BuildLine():
            CenterArc((FILLET1_R, -FILLET1_R), FILLET1_R, 90, 90)
            Line((0, -FILLET1_R), (0, 0))
            Line((0, 0), (FILLET1_R, 0))
        make_face()
    extrude(amount=11.5, mode=Mode.SUBTRACT)
    with BuildSketch(Plane(origin=(16, 30.5, 3.5), x_dir=(0, -1, 0), z_dir=(0, 0, -1))) as fillet1_2_piece_8:
        with BuildLine():
            CenterArc((FILLET1_R, -FILLET1_R), FILLET1_R, 90, 90)
            Line((0, -FILLET1_R), (0, 0))
            Line((0, 0), (FILLET1_R, 0))
        make_face()
    extrude(amount=19, mode=Mode.SUBTRACT)
    with BuildSketch(Plane(origin=(1.964101615, 43.5, -17.5), x_dir=(0, -1, 0), z_dir=(1, 0, 0))) as fillet1_2_piece_9_section:
        with BuildLine():
            CenterArc((FILLET1_R, -FILLET1_R), FILLET1_R, 90, 90)
            Line((0, -FILLET1_R), (0, 0))
            Line((0, 0), (FILLET1_R, 0))
        make_face()
    fillet1_2_piece_9 = extrude(amount=27.07179677, mode=Mode.PRIVATE)
    fillet1_2_piece_9 = fillet1_2_piece_9 - Plane(origin=(3.5, 44, -17.056366893), x_dir=(-1, 0, 0), z_dir=(0, 0, 1)) * Cylinder(3.5, 63, mode=Mode.PRIVATE)
    fillet1_2_piece_9 = fillet1_2_piece_9 - Plane(origin=(27.5, 44, -17.056366893), x_dir=(-0.9897433186107873, -0.14285714285714077, 0), z_dir=(0, 0, 1)) * Cylinder(3.5, 63, mode=Mode.PRIVATE)
    add(fillet1_2_piece_9, mode=Mode.SUBTRACT)
    with BuildSketch(Plane(origin=(25, 28.5, -15.5), x_dir=(0, 1, 0), z_dir=(0, 0, -1))) as fillet1_2_piece_10:
        with BuildLine():
            CenterArc((FILLET1_R, -FILLET1_R), FILLET1_R, 90, 90)
            Line((0, -FILLET1_R), (0, 0))
            Line((0, 0), (FILLET1_R, 0))
        make_face()
    extrude(amount=7, mode=Mode.SUBTRACT)

    # Cut-Extrude11: up to this face of the body (flat: up to its plane)
    cut_extrude11_end = Plane(body_2.part.faces().sort_by_distance((7.302519528, 34.317007669, -1.5))[0])
    # Sketch21 → Cut-Extrude11 (cut, up to the picked face)
    with BuildSketch(Plane(origin=(0, 0, -17.5), x_dir=(-1, 0, 0), z_dir=(0, 0, -1)), mode=Mode.PRIVATE) as cut_extrude11_sk1:
        with Locations((-20.5, 29.818019485)):
            Rectangle(SKETCH21_W, SKETCH21_H)
    cut_extrude11_tool1 = split(extrude(cut_extrude11_sk1.sketch, amount=-CUT_EXTRUDE11_REACH, mode=Mode.PRIVATE), bisect_by=cut_extrude11_end, keep=Keep.BOTH, mode=Mode.PRIVATE)
    add(cut_extrude11_tool1.solids().sort_by(Axis((20.5, 29.818019, -17.5), (0, 0, 1)))[0], mode=Mode.SUBTRACT)

    # Sketch23 → Boss-Extrude7 (add)
    with BuildSketch(Plane.XZ.offset(-24.5)):
        with Locations((9, -8.5)):
            Circle(SKETCH23_R)
    extrude(amount=-BOSS_EXTRUDE7_DEPTH)

    # Fillet2
    fillet2_edges = [body_2.edges().sort_by_distance(p)[0] for p in [
        (1, 39.5, -13.5),
        (1, 39.5, -4),
        (16, 35.136038969, -16.5),
        (24, 35.136038969, -1.5),
    ]]
    fillet(fillet2_edges, radius=FILLET2_R)


solid = Compound([part.part, body_2.part])
